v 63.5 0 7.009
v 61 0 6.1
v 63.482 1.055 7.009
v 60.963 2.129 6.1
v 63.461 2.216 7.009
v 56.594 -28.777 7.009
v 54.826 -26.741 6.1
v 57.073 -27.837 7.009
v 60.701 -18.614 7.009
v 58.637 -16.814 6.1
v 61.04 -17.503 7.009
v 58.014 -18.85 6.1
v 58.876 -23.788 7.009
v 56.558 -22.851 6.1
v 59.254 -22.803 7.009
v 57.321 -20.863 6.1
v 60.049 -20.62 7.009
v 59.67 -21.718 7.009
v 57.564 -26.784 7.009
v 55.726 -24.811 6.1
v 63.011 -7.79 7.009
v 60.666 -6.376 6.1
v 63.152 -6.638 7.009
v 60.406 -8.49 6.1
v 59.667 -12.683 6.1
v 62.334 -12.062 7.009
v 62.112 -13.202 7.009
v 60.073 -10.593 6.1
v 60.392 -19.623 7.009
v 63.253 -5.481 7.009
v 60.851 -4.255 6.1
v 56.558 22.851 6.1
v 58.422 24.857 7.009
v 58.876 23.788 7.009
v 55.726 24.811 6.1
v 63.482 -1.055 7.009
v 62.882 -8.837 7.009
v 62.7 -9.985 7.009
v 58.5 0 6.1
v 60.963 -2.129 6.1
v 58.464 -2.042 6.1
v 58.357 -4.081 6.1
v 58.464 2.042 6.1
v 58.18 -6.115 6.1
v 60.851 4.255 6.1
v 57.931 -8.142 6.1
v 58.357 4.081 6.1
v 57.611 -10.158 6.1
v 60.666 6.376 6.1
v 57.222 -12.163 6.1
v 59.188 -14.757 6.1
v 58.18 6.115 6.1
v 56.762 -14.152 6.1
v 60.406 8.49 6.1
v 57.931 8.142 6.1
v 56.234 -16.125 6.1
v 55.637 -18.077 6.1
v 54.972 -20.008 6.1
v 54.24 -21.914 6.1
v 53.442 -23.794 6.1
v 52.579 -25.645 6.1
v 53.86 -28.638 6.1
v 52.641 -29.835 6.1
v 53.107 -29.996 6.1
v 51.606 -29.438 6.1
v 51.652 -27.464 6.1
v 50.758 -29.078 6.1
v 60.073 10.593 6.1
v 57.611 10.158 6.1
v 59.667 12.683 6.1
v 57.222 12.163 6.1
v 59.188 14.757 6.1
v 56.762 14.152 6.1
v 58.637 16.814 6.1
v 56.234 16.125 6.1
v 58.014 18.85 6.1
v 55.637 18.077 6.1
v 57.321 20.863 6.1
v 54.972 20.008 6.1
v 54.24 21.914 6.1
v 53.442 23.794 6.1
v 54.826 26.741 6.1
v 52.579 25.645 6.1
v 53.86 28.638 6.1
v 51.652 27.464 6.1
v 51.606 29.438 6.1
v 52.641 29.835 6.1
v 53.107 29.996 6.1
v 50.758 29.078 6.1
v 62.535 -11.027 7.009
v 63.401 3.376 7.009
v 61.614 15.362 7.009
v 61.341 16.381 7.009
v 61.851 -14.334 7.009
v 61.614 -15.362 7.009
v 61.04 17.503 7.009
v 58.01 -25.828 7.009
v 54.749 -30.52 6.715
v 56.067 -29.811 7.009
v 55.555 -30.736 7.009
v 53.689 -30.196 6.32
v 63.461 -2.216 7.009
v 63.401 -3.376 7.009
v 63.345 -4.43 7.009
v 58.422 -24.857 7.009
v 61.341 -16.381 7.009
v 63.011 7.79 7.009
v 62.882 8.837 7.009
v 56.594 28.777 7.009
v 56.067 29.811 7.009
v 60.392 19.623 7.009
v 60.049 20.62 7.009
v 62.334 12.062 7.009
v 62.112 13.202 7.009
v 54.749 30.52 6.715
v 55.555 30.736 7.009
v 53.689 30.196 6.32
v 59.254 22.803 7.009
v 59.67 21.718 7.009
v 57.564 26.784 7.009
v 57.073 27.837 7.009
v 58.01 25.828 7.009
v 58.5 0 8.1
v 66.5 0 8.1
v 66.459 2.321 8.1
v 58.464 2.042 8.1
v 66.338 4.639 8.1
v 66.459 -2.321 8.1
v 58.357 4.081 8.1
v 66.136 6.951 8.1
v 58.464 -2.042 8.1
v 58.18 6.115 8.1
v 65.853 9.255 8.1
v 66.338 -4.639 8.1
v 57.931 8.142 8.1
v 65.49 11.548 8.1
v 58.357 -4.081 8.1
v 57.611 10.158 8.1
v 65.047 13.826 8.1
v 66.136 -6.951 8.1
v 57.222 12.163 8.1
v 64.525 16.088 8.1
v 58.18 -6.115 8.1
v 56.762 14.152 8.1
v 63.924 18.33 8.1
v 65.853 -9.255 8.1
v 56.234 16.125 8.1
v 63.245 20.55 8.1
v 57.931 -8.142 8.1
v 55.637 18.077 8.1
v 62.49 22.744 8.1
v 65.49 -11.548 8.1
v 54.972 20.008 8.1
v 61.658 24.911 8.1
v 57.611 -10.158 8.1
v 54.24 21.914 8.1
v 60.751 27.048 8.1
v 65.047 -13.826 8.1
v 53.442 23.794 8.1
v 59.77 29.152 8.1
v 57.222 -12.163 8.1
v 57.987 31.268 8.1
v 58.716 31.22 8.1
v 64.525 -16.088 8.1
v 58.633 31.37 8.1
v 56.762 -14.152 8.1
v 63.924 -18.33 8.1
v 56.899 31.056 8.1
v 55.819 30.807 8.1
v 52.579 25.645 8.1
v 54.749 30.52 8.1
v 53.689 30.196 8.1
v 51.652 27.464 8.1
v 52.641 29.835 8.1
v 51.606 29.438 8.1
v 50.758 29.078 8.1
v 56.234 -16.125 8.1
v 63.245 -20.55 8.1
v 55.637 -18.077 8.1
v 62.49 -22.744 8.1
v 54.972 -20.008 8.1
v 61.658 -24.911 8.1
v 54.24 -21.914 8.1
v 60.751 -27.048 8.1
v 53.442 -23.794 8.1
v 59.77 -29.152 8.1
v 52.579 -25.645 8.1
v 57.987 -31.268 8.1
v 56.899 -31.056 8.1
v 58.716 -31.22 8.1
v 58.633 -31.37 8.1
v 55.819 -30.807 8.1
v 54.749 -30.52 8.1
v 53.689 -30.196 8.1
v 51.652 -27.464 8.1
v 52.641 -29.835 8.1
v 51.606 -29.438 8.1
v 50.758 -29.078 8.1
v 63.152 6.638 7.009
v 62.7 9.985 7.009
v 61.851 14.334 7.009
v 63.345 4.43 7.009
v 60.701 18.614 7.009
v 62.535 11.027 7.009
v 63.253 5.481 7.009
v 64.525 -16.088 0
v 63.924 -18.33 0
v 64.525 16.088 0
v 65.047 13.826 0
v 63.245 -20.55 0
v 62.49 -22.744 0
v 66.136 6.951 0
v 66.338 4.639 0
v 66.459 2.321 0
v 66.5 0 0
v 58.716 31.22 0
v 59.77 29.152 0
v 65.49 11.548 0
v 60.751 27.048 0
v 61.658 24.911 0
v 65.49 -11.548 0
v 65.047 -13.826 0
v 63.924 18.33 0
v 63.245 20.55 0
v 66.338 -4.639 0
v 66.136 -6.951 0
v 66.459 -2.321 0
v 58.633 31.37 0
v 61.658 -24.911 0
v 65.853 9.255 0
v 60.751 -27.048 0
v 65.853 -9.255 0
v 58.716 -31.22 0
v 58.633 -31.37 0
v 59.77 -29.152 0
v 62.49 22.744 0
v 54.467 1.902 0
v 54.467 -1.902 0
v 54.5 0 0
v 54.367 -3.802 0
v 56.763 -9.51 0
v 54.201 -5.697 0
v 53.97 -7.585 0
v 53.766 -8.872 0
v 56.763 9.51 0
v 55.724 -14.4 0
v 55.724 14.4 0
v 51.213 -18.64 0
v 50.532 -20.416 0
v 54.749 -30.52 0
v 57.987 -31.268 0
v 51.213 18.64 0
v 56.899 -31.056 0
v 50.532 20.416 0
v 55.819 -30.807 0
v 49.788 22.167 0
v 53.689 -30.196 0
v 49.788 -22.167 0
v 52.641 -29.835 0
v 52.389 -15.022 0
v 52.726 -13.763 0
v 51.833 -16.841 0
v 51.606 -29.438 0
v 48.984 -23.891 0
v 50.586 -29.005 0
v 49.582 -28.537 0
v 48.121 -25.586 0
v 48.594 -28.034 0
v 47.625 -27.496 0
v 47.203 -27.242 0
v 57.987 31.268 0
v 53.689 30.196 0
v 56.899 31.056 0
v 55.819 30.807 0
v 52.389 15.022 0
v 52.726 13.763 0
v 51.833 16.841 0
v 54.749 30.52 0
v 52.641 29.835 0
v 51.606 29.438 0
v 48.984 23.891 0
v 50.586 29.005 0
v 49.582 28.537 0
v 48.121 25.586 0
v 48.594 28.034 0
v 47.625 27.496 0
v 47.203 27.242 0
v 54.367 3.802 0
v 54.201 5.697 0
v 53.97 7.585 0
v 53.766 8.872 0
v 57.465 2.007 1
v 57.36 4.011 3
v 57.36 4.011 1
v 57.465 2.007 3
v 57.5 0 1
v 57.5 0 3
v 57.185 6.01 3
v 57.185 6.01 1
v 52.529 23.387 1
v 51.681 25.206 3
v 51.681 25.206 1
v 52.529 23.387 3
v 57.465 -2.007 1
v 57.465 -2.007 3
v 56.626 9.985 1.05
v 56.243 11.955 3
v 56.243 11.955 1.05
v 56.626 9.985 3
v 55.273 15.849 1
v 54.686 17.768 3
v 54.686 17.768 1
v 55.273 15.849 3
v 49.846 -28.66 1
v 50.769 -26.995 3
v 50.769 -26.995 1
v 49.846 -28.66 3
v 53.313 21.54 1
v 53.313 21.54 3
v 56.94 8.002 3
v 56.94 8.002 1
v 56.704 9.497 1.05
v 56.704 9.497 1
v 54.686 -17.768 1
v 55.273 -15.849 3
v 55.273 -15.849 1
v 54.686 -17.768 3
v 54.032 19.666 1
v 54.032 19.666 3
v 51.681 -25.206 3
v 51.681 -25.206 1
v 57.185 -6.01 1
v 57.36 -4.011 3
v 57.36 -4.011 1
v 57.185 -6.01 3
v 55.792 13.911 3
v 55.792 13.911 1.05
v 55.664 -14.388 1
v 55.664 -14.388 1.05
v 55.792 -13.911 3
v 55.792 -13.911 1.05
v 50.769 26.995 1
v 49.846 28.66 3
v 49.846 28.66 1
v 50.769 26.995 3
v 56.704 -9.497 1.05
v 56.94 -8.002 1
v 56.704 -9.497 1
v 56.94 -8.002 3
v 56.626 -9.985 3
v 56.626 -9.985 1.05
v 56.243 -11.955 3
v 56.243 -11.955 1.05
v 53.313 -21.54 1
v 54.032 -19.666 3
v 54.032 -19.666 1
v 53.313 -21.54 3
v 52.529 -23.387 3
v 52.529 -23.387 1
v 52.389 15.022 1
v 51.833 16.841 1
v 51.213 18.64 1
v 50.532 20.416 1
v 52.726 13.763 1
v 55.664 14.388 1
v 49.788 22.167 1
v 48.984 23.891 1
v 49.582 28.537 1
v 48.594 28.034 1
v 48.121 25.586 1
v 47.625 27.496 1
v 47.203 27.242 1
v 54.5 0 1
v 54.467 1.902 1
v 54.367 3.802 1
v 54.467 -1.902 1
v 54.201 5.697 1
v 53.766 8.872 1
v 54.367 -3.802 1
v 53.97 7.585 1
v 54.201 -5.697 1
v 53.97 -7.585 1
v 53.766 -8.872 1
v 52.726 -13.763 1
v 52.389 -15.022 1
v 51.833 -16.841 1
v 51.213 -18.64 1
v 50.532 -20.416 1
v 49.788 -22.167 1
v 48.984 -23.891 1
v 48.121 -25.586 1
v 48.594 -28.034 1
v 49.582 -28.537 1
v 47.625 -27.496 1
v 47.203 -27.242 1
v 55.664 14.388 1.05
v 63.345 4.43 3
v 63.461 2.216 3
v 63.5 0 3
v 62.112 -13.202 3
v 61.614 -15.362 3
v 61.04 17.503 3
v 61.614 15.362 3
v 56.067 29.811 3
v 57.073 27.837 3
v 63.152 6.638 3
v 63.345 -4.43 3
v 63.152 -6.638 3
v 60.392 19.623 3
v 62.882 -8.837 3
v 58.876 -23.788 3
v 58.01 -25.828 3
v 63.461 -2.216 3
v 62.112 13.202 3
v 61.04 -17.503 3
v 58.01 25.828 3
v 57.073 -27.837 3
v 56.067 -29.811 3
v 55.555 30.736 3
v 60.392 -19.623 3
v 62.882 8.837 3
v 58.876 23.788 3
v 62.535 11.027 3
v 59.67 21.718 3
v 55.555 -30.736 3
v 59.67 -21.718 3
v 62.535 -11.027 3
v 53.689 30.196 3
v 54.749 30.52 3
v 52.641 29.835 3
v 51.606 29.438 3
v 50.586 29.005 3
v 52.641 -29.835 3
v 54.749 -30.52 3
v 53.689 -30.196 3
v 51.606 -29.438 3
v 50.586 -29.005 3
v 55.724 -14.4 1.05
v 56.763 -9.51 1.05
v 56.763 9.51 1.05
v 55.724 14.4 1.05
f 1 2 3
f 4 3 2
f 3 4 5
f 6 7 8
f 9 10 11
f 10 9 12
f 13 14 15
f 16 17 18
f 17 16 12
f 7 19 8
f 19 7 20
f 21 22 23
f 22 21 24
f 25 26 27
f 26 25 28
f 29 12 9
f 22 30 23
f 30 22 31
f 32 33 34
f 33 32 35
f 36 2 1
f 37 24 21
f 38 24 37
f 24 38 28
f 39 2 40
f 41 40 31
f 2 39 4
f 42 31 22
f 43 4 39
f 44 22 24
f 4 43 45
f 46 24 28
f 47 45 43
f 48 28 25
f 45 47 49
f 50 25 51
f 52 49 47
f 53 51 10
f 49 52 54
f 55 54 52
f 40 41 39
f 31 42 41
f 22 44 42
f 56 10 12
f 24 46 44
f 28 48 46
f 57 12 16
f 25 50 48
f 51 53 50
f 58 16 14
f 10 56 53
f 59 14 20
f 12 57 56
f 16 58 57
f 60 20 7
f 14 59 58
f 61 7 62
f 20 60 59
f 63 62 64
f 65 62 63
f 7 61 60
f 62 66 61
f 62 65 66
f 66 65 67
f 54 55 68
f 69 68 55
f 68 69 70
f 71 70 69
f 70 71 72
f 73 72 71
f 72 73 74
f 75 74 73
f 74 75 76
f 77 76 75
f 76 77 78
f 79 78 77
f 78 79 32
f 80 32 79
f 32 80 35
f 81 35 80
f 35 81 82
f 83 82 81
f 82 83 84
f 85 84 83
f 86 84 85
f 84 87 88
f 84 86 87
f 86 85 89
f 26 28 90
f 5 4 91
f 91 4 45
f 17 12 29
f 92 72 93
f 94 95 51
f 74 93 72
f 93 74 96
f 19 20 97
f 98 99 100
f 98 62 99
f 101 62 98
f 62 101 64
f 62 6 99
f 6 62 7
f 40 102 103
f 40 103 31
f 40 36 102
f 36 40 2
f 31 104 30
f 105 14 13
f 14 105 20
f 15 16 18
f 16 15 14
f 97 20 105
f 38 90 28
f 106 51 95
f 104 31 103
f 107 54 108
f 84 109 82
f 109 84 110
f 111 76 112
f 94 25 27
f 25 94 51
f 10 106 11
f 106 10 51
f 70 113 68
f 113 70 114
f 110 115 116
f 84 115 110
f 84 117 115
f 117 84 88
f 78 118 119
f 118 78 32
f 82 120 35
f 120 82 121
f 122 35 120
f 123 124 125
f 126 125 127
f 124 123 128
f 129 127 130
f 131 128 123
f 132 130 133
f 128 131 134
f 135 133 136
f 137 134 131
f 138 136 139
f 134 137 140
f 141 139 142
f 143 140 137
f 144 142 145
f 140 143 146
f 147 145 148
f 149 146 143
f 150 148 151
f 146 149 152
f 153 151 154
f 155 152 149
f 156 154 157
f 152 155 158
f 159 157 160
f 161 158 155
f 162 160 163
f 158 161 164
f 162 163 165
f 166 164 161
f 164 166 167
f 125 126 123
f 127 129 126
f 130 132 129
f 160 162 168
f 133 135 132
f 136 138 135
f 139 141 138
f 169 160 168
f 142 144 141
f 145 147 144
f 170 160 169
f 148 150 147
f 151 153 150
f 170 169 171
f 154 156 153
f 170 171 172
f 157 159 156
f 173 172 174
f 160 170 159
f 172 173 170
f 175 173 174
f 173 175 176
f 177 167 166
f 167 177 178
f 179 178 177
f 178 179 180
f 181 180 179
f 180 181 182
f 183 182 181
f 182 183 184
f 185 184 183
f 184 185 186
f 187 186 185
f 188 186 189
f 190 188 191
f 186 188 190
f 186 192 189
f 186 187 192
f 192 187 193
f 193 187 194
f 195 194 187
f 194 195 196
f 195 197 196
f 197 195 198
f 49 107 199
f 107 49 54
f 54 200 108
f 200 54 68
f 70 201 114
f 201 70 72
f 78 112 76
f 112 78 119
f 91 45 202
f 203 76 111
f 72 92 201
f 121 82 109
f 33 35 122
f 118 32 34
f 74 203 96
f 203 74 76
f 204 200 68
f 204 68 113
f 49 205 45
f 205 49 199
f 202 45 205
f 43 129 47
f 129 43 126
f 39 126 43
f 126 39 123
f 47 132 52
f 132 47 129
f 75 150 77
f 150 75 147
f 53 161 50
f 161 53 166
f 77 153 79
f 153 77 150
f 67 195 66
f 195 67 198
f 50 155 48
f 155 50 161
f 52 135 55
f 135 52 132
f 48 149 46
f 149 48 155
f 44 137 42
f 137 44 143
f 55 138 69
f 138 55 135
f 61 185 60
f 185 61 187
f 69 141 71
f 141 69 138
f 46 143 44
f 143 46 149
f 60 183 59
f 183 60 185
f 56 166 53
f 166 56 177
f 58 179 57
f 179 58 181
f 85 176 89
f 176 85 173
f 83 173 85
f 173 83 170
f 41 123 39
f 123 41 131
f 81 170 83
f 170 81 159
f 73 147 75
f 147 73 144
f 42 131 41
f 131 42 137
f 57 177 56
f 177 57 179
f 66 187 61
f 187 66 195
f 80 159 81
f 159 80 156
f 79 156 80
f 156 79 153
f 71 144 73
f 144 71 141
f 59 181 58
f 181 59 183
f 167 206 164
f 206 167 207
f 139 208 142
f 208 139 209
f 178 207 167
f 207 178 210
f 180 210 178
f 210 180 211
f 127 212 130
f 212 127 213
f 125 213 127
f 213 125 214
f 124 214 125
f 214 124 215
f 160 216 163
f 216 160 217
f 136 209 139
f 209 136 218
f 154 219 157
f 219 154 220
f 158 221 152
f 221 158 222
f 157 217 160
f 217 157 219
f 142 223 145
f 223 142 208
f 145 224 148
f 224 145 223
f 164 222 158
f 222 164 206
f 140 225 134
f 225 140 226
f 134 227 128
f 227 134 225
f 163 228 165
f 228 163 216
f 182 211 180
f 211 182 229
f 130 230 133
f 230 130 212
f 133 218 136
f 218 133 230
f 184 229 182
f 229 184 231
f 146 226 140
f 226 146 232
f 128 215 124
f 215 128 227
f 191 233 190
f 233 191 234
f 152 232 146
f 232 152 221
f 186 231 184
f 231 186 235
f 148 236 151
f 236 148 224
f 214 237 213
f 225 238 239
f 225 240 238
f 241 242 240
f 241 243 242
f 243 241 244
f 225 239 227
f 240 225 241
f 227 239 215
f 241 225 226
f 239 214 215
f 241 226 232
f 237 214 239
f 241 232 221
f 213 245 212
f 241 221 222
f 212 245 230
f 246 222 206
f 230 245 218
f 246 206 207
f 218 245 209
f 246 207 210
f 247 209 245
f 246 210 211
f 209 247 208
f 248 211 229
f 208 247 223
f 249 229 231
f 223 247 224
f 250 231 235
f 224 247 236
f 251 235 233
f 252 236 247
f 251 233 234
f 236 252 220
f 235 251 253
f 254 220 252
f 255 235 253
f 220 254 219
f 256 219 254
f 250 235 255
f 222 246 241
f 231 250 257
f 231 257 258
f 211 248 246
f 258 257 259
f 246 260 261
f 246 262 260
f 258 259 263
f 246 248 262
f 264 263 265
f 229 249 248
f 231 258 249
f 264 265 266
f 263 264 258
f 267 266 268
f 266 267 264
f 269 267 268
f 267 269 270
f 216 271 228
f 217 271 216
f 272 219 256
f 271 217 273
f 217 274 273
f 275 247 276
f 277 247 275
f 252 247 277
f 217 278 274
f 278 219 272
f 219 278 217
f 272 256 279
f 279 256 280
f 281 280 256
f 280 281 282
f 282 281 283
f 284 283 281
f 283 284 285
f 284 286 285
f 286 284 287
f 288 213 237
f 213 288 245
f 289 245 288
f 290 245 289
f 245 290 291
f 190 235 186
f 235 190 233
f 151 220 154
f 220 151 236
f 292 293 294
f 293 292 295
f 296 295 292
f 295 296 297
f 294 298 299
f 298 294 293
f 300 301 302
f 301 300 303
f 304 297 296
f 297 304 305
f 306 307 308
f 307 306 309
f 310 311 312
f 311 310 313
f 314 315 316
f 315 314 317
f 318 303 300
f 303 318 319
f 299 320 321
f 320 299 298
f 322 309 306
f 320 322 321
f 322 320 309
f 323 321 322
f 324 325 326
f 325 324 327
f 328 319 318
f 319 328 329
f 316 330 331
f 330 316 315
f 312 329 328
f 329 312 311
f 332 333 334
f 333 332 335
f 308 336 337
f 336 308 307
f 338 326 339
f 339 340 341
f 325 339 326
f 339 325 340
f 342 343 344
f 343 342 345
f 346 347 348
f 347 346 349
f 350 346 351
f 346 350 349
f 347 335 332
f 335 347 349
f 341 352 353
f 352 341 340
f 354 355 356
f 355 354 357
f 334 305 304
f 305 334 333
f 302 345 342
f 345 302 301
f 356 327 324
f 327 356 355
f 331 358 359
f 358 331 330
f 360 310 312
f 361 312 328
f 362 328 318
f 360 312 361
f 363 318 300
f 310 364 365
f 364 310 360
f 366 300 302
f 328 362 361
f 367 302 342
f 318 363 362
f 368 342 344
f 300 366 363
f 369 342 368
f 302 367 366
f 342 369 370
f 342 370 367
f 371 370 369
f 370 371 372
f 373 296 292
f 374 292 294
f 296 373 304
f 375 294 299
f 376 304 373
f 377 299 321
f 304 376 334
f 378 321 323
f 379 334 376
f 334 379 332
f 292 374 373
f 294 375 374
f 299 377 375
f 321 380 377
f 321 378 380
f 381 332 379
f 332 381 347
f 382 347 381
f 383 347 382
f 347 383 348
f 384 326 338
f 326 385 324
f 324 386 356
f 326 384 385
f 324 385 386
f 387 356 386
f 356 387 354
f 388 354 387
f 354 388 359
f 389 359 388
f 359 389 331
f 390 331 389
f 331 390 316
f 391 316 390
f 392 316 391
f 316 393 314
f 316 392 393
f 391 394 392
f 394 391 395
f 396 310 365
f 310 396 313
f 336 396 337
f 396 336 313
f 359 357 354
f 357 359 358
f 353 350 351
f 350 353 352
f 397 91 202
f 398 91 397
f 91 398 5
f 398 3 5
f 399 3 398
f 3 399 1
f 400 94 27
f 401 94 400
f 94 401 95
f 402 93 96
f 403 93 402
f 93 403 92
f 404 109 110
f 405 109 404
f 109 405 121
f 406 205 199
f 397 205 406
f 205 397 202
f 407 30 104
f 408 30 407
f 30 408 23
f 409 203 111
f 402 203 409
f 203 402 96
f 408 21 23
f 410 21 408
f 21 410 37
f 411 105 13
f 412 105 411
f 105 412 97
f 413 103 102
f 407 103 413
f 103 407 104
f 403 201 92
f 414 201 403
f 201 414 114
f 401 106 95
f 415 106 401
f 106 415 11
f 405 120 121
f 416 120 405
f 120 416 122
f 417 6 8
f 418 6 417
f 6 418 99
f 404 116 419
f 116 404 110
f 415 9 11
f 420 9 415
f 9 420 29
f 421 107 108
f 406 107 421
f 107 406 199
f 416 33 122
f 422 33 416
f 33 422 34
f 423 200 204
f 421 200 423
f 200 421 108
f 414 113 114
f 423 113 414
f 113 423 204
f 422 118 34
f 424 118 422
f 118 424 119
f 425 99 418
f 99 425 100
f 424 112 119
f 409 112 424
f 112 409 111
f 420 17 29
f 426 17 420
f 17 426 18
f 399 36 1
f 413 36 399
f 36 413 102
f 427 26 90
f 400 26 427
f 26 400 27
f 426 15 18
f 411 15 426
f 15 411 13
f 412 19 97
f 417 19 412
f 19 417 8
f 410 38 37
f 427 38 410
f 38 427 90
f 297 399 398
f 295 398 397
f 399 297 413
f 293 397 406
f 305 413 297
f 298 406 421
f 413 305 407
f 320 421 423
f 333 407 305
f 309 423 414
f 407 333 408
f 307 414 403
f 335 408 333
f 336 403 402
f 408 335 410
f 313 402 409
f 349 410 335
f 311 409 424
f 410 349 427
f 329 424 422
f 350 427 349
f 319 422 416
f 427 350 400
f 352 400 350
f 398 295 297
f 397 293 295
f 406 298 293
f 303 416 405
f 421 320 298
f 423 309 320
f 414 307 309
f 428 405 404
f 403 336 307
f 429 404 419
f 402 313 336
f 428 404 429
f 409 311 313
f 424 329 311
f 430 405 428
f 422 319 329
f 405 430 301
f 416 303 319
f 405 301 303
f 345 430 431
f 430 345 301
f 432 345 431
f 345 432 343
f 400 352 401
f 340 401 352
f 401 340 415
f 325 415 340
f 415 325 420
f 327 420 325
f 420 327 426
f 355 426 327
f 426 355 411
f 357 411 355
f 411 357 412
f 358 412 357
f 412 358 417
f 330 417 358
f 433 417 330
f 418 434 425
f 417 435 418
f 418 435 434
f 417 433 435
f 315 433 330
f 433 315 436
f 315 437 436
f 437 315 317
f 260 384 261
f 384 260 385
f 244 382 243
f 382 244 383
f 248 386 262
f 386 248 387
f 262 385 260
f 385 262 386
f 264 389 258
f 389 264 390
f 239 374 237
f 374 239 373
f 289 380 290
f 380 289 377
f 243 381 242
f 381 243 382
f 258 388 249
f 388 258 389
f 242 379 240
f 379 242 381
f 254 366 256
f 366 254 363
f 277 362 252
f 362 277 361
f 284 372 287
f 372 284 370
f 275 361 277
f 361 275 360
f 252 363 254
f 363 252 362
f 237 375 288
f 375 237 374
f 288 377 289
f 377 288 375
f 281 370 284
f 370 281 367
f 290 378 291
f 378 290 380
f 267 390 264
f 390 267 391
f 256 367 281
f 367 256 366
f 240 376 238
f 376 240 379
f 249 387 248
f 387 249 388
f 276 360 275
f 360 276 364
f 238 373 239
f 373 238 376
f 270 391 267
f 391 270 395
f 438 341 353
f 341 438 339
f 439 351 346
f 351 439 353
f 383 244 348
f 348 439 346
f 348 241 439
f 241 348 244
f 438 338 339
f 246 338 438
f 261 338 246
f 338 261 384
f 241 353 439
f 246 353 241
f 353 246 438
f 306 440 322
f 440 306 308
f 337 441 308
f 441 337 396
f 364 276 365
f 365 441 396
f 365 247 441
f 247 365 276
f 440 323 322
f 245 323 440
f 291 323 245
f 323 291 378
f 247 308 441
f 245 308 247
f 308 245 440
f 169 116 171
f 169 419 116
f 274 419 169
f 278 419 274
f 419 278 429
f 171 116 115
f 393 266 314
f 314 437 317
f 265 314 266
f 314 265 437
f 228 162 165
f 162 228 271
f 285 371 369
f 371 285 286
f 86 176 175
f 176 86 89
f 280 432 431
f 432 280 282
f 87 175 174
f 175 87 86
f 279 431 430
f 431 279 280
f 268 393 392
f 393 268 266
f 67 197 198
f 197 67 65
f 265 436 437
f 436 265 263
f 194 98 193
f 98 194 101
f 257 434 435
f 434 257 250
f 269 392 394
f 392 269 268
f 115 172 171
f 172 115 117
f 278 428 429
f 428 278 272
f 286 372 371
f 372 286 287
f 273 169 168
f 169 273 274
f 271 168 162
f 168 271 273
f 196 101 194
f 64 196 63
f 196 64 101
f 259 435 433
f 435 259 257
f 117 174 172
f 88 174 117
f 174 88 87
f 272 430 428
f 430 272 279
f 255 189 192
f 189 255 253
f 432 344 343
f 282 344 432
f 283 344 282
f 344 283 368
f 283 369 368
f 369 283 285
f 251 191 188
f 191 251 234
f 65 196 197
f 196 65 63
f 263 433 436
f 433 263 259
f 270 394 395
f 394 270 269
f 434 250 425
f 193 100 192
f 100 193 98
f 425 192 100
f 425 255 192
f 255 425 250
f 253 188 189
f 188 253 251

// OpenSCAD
//Author: Nathaniel Stenzel
//May 21, 2019
//Use this to hold down a glass bed for a Monoprice Mini Delta Printer

$fn=180;
glass_thickness= 3.1;   // thickness of glass in mm
bed_radius = 57.5;   // radius of bed in mm
glass_radius = 63.5; // radius of glass in mm

radius = max(bed_radius,glass_radius);
overhang_thickness = 2;   // thickness of overhanging lip that holds glass
overhang_width = 5;     // how far lip extends over the glass.

above_plate= glass_thickness+overhang_thickness;

plate = 2;      // Existing plate is 2mm thick
below_plate=1;  // Max thickness below plate 
                // (2mm space, but need 1mm travel for bed leveling)

height = above_plate + plate + below_plate;

intersection(){
union(){
     //the glass gripper on top
    difference(){
translate([0,0,height-overhang_thickness])cylinder(r1=glass_radius-overhang_width/2,r2=glass_radius+3, h=overhang_thickness);
translate([0,0,below_plate+plate])cylinder(r=glass_radius-overhang_width,h=glass_thickness+overhang_thickness+1); //subtract from bottom of glass to inner rim at the top
}
//the area at glass surface and below
difference(){
cylinder(r=radius+3,h=height);
translate([0,0,below_plate])cylinder(r=bed_radius,h=plate+0.001);
translate([0,0,below_plate+plate])cylinder(r=glass_radius,h=glass_thickness+overhang_thickness+1); //subtract from bottom of glass to inner rim at the top
translate([0,0,-0.1])cylinder(r=bed_radius-3,h=below_plate+0.2);
translate([0,0,below_plate/2-0.1])rotate([0,0,78])cube([5,bed_radius*2,below_plate+0.3],center=true); //slot 1
translate([0,0,below_plate/2-0.1])rotate([0,0,102])cube([5,bed_radius*2,below_plate+0.3],center=true); //slot 2
}
    } //end of combined top and bottom
//the disc that those two parts must intersect with to make our part
translate([radius,0,-0.1])cylinder(r=radius/2,h=height+0.1);
}
